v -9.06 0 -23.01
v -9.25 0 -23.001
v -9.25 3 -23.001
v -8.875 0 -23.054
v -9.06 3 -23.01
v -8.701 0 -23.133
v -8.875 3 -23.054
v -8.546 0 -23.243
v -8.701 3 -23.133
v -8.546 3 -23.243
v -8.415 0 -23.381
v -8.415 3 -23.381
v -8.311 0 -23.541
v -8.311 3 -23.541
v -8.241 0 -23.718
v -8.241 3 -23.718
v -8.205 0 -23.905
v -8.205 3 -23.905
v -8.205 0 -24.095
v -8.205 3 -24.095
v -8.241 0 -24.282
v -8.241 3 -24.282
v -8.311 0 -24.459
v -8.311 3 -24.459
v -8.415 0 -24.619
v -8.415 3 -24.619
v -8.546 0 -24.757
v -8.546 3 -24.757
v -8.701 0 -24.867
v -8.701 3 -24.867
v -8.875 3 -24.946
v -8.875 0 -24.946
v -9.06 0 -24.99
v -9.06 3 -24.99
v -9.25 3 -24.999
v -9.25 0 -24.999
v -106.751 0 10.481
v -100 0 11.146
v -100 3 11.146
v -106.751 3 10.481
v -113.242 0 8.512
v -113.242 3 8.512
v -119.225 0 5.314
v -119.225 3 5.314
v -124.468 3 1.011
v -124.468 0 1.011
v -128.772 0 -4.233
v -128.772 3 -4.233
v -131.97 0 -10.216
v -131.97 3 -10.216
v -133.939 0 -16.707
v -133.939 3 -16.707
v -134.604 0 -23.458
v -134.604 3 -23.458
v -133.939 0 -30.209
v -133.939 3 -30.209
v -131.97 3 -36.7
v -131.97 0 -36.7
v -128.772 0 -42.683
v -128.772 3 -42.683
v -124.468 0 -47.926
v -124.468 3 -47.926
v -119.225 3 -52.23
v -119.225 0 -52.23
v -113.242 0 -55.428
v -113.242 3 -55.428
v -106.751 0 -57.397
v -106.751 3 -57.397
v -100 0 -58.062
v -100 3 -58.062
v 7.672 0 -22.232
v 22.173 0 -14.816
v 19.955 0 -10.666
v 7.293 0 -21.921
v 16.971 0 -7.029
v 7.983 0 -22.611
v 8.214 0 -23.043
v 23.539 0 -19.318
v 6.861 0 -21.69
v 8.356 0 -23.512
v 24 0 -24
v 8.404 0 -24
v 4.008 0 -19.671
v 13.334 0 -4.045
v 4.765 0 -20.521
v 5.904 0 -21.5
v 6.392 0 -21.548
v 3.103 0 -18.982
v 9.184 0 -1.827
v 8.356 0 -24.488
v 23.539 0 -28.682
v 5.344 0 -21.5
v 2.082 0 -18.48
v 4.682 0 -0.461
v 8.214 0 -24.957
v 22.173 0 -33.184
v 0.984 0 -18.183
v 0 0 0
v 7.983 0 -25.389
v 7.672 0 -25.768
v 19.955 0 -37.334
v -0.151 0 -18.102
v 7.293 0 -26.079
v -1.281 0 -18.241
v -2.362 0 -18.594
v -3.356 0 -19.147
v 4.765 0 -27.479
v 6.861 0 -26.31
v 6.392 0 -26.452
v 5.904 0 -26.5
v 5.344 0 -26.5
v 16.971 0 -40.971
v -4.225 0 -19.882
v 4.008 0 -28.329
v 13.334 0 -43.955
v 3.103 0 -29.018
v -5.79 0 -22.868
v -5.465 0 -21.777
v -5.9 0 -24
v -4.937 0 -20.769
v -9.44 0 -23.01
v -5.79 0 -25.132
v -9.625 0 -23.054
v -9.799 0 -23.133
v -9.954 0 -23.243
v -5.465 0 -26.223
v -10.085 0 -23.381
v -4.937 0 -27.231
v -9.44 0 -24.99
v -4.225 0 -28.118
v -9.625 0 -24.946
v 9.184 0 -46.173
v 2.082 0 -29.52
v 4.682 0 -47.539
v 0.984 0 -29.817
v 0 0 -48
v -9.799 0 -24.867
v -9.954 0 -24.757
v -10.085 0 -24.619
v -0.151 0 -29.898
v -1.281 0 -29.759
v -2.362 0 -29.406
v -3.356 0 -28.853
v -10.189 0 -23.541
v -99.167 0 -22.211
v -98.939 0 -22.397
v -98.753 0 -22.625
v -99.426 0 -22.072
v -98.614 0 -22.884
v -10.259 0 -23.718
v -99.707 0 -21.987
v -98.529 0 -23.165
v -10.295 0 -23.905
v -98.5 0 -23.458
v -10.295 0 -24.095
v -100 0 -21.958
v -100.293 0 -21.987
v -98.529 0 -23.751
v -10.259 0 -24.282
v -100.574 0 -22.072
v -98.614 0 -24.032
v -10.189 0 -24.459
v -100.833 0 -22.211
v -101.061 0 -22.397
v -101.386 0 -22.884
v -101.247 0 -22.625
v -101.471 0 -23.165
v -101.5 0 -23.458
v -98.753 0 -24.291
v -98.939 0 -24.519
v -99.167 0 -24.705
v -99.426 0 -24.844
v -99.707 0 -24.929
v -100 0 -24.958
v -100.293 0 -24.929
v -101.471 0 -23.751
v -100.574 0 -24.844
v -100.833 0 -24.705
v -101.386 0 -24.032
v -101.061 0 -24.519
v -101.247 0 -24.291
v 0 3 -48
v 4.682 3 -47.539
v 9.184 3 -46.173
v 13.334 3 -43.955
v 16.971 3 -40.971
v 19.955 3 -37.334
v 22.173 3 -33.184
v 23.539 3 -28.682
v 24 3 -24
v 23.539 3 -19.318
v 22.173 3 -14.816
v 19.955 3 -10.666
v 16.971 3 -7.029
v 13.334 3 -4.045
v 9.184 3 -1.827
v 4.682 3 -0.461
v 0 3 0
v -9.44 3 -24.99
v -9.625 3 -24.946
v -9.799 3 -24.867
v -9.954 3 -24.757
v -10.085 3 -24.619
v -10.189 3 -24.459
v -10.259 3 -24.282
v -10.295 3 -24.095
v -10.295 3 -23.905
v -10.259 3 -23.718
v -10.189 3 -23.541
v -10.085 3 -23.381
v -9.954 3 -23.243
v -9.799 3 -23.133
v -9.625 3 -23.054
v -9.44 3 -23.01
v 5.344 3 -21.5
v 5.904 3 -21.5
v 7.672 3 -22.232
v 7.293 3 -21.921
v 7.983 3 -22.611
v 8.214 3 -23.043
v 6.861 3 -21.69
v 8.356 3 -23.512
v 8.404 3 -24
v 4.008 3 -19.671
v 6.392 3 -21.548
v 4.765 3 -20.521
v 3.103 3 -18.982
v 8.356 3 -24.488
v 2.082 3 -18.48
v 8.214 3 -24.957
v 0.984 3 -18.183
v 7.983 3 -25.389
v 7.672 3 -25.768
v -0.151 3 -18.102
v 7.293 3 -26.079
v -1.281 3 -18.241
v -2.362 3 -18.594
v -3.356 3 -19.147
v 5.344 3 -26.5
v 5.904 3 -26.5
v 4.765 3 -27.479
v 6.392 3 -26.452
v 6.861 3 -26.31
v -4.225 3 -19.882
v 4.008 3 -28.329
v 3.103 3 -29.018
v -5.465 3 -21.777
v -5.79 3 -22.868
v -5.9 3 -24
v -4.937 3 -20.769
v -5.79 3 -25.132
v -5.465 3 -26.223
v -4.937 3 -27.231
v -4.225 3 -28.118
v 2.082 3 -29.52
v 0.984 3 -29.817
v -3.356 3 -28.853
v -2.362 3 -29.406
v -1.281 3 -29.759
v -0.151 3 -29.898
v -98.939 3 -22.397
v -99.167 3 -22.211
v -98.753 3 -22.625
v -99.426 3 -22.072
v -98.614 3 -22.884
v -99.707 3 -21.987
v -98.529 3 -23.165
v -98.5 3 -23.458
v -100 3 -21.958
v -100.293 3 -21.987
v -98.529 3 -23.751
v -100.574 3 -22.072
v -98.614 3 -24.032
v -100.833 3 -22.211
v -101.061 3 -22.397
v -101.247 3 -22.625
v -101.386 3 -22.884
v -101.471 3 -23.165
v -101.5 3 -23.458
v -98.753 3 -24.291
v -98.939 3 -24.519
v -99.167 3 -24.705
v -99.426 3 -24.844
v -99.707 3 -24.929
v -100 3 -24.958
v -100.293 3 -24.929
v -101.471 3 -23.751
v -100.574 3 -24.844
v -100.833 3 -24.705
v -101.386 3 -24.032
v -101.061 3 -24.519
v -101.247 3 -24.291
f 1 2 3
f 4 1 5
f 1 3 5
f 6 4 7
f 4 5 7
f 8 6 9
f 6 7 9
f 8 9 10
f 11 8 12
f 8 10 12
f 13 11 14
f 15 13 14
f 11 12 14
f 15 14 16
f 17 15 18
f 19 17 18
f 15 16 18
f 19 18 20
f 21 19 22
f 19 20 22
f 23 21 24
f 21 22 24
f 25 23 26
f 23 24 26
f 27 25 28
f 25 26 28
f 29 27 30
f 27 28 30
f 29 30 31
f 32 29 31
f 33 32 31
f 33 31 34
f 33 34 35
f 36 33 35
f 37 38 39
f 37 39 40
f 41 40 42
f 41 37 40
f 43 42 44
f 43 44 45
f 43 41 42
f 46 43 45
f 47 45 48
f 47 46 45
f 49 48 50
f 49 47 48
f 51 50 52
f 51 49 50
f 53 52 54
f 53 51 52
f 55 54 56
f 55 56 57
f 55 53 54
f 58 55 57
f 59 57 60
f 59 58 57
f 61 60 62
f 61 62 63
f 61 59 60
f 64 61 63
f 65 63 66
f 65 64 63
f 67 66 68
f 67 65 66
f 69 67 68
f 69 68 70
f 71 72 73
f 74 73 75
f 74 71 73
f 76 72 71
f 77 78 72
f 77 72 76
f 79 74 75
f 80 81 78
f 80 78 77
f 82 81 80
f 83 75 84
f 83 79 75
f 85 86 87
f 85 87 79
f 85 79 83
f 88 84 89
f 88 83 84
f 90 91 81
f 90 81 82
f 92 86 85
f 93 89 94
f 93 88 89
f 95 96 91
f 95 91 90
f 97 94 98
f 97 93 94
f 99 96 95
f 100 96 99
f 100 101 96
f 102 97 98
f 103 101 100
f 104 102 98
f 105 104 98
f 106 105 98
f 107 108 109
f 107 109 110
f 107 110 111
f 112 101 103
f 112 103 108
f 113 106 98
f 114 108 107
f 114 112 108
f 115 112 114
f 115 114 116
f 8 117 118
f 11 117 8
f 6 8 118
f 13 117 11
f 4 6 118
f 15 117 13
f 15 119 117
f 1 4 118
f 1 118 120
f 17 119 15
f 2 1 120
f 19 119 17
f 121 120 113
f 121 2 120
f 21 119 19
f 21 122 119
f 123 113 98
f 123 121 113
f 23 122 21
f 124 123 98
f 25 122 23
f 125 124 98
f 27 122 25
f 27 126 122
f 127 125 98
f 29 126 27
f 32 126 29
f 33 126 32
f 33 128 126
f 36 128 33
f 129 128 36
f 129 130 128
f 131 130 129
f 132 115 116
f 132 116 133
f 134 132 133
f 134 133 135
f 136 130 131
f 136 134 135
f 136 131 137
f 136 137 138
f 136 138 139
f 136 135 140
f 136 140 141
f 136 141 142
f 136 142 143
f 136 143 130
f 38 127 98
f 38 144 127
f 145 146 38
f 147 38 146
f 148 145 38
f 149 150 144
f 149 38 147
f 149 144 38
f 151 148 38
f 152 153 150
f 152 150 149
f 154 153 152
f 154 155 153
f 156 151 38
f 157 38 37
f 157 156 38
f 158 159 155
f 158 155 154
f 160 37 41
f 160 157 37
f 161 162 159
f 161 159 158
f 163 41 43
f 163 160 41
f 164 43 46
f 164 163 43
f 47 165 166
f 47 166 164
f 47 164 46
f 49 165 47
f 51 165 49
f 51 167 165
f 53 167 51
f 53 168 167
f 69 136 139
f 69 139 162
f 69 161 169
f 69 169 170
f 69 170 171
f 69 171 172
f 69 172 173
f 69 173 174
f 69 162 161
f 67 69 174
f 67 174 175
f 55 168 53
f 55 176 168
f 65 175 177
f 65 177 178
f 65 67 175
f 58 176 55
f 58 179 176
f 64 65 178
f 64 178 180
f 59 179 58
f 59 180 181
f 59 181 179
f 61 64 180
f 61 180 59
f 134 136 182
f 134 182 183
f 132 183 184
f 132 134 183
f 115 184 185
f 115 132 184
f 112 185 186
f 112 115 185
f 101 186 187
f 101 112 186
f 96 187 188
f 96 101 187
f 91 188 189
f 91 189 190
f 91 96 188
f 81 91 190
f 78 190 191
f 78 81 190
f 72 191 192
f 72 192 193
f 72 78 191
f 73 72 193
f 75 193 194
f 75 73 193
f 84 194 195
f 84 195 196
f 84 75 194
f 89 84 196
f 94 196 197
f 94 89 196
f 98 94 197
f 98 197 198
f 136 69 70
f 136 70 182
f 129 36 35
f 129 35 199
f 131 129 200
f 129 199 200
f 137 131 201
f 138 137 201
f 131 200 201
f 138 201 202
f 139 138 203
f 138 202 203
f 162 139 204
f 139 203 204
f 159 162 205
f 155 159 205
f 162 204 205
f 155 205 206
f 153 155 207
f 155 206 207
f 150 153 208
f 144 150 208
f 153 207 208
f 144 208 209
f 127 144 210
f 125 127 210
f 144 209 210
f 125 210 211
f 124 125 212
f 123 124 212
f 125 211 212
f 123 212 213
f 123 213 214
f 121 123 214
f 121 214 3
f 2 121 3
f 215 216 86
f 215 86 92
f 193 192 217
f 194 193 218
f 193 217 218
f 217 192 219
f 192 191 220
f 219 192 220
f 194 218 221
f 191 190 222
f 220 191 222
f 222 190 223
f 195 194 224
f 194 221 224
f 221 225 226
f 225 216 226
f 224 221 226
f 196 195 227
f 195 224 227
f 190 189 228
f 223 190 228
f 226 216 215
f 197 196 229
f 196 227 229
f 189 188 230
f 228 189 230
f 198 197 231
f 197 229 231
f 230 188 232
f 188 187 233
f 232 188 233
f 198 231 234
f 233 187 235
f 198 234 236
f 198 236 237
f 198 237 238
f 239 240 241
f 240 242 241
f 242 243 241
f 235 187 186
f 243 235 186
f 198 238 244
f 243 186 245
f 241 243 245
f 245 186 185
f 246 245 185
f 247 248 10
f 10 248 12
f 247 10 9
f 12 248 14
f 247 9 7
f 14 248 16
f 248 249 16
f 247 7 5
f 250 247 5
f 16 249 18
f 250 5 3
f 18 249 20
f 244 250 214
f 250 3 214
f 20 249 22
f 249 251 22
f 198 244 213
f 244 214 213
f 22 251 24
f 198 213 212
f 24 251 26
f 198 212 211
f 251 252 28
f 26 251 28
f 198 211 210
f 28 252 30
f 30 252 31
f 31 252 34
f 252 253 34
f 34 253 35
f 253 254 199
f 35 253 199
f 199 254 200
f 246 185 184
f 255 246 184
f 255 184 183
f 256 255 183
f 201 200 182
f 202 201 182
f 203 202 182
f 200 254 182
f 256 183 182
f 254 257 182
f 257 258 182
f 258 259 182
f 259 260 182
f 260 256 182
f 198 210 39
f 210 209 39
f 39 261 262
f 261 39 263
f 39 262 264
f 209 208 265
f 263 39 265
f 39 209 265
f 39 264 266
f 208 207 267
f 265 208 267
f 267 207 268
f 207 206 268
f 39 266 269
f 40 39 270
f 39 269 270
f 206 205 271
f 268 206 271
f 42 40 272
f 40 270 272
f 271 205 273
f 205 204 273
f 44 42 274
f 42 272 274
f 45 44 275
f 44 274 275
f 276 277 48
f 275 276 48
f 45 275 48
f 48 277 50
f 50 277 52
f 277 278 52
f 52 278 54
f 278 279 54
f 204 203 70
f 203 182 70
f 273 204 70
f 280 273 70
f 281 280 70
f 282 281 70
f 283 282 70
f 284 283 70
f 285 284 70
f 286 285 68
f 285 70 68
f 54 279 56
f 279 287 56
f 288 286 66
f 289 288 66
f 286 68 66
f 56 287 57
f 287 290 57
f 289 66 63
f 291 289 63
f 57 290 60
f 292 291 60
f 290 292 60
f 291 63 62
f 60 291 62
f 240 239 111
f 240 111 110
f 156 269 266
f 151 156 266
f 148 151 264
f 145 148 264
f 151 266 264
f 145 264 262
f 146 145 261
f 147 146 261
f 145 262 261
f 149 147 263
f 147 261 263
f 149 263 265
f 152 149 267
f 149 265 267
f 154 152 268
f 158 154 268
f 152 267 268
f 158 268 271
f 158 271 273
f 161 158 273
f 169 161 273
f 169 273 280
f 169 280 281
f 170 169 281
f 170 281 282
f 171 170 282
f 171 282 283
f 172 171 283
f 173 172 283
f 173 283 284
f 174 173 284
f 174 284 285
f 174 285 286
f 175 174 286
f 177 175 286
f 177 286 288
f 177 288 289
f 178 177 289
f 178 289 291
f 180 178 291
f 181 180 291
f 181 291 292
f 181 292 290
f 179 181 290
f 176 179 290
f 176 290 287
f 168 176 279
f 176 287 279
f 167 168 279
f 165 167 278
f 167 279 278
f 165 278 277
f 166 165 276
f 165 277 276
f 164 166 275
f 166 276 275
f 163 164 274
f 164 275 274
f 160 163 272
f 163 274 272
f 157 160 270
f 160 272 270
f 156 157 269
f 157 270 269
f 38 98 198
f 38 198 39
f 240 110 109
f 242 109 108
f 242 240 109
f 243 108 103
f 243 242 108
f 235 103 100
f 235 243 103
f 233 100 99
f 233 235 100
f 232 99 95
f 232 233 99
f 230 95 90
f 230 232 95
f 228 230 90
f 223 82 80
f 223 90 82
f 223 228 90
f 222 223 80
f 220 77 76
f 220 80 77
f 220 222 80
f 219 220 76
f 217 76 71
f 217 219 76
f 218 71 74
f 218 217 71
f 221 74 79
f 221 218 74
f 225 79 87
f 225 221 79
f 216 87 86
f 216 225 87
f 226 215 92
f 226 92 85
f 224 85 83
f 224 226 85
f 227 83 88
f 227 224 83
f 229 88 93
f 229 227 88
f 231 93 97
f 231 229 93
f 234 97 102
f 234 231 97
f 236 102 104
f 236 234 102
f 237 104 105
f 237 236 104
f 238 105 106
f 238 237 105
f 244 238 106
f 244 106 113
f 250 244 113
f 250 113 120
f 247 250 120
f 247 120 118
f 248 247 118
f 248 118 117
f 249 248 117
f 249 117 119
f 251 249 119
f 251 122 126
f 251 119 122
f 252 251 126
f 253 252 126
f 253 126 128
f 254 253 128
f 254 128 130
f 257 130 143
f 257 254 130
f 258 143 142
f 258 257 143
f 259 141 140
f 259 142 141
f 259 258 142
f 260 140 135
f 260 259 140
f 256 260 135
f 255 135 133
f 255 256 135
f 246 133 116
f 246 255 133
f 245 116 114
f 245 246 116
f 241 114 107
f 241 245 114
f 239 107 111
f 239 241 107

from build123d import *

# Parameters (mm, degrees)
BOSS_EXTRUDE2_DEPTH = 3
CUT_EXTRUDE4_DEPTH  = 10
SKETCH8_R           = 1
CUT_EXTRUDE5_DEPTH  = 10
SKETCH6_R           = 1.5
CUT_EXTRUDE6_DEPTH  = 10
CUT_EXTRUDE2_DEPTH  = 3
SKETCH5_R           = 1
CUT_EXTRUDE3_DEPTH  = 3


with BuildPart() as part:
    # Sketch2 → Boss-Extrude2 (new body)
    with BuildSketch(Plane(origin=(0, 0, 0), x_dir=(1, 0, 0), z_dir=(0, 1, 0))):
        with BuildLine():
            Line((-100, 58.061579531), (0, 48))
            ThreePointArc((0, 48), (24, 24), (0, 0))
            Line((0, 0), (-100, -11.145771569))
            ThreePointArc((-100, -11.145771569), (-134.60367555, 23.457903981), (-100, 58.061579531))
        make_face()
    extrude(amount=BOSS_EXTRUDE2_DEPTH)

    # Sketch7 → Cut-Extrude4 (cut)
    with BuildSketch(Plane(origin=(0, 3, 0), x_dir=(1, 0, 0), z_dir=(0, 1, 0))):
        with BuildLine():
            Line((5.344155686, 26.5), (5.904155686, 26.5))
            ThreePointArc((5.904155686, 26.5), (8.404155686, 24), (5.904155686, 21.5))
            Line((5.904155686, 21.5), (5.344155686, 21.5))
            ThreePointArc((5.344155686, 21.5), (-5.9, 24), (5.344155686, 26.5))
        make_face()
    extrude(amount=-CUT_EXTRUDE4_DEPTH, mode=Mode.SUBTRACT)

    # Sketch8 → Cut-Extrude5 (cut)
    with BuildSketch(Plane(origin=(0, 3, 0), x_dir=(1, 0, 0), z_dir=(0, 1, 0))):
        with Locations(Location((-9.2, 24, 0), (0, 0, 270))):
            Circle(SKETCH8_R)
    extrude(amount=-CUT_EXTRUDE5_DEPTH, mode=Mode.SUBTRACT)

    # Sketch6 → Cut-Extrude6 (cut)
    with BuildSketch(Plane(origin=(0, 3, 0), x_dir=(1, 0, 0), z_dir=(0, 1, 0))):
        with Locations(Location((-100, 23.457903981, 0), (0, 0, 270))):
            Circle(SKETCH6_R)
    extrude(amount=-CUT_EXTRUDE6_DEPTH, mode=Mode.SUBTRACT)

    # Sketch3 → Cut-Extrude2 (cut)
    with BuildSketch(Plane(origin=(0, 3, 0), x_dir=(1, 0, 0), z_dir=(0, 1, 0))):
        with BuildLine():
            Line((5.344155686, 26.5), (5.9, 26.5))
            ThreePointArc((5.9, 26.5), (8.4, 24), (5.9, 21.5))
            Line((5.9, 21.5), (5.344155686, 21.5))
            ThreePointArc((5.344155686, 21.5), (-5.9, 24), (5.344155686, 26.5))
        make_face()
    extrude(amount=-CUT_EXTRUDE2_DEPTH, mode=Mode.SUBTRACT)

    # Sketch5 → Cut-Extrude3 (cut)
    with BuildSketch(Plane(origin=(0, 3, 0), x_dir=(1, 0, 0), z_dir=(0, 1, 0))):
        with Locations((-9.3, 24)):
            Circle(SKETCH5_R)
    extrude(amount=-CUT_EXTRUDE3_DEPTH, mode=Mode.SUBTRACT)


solid = part.part
